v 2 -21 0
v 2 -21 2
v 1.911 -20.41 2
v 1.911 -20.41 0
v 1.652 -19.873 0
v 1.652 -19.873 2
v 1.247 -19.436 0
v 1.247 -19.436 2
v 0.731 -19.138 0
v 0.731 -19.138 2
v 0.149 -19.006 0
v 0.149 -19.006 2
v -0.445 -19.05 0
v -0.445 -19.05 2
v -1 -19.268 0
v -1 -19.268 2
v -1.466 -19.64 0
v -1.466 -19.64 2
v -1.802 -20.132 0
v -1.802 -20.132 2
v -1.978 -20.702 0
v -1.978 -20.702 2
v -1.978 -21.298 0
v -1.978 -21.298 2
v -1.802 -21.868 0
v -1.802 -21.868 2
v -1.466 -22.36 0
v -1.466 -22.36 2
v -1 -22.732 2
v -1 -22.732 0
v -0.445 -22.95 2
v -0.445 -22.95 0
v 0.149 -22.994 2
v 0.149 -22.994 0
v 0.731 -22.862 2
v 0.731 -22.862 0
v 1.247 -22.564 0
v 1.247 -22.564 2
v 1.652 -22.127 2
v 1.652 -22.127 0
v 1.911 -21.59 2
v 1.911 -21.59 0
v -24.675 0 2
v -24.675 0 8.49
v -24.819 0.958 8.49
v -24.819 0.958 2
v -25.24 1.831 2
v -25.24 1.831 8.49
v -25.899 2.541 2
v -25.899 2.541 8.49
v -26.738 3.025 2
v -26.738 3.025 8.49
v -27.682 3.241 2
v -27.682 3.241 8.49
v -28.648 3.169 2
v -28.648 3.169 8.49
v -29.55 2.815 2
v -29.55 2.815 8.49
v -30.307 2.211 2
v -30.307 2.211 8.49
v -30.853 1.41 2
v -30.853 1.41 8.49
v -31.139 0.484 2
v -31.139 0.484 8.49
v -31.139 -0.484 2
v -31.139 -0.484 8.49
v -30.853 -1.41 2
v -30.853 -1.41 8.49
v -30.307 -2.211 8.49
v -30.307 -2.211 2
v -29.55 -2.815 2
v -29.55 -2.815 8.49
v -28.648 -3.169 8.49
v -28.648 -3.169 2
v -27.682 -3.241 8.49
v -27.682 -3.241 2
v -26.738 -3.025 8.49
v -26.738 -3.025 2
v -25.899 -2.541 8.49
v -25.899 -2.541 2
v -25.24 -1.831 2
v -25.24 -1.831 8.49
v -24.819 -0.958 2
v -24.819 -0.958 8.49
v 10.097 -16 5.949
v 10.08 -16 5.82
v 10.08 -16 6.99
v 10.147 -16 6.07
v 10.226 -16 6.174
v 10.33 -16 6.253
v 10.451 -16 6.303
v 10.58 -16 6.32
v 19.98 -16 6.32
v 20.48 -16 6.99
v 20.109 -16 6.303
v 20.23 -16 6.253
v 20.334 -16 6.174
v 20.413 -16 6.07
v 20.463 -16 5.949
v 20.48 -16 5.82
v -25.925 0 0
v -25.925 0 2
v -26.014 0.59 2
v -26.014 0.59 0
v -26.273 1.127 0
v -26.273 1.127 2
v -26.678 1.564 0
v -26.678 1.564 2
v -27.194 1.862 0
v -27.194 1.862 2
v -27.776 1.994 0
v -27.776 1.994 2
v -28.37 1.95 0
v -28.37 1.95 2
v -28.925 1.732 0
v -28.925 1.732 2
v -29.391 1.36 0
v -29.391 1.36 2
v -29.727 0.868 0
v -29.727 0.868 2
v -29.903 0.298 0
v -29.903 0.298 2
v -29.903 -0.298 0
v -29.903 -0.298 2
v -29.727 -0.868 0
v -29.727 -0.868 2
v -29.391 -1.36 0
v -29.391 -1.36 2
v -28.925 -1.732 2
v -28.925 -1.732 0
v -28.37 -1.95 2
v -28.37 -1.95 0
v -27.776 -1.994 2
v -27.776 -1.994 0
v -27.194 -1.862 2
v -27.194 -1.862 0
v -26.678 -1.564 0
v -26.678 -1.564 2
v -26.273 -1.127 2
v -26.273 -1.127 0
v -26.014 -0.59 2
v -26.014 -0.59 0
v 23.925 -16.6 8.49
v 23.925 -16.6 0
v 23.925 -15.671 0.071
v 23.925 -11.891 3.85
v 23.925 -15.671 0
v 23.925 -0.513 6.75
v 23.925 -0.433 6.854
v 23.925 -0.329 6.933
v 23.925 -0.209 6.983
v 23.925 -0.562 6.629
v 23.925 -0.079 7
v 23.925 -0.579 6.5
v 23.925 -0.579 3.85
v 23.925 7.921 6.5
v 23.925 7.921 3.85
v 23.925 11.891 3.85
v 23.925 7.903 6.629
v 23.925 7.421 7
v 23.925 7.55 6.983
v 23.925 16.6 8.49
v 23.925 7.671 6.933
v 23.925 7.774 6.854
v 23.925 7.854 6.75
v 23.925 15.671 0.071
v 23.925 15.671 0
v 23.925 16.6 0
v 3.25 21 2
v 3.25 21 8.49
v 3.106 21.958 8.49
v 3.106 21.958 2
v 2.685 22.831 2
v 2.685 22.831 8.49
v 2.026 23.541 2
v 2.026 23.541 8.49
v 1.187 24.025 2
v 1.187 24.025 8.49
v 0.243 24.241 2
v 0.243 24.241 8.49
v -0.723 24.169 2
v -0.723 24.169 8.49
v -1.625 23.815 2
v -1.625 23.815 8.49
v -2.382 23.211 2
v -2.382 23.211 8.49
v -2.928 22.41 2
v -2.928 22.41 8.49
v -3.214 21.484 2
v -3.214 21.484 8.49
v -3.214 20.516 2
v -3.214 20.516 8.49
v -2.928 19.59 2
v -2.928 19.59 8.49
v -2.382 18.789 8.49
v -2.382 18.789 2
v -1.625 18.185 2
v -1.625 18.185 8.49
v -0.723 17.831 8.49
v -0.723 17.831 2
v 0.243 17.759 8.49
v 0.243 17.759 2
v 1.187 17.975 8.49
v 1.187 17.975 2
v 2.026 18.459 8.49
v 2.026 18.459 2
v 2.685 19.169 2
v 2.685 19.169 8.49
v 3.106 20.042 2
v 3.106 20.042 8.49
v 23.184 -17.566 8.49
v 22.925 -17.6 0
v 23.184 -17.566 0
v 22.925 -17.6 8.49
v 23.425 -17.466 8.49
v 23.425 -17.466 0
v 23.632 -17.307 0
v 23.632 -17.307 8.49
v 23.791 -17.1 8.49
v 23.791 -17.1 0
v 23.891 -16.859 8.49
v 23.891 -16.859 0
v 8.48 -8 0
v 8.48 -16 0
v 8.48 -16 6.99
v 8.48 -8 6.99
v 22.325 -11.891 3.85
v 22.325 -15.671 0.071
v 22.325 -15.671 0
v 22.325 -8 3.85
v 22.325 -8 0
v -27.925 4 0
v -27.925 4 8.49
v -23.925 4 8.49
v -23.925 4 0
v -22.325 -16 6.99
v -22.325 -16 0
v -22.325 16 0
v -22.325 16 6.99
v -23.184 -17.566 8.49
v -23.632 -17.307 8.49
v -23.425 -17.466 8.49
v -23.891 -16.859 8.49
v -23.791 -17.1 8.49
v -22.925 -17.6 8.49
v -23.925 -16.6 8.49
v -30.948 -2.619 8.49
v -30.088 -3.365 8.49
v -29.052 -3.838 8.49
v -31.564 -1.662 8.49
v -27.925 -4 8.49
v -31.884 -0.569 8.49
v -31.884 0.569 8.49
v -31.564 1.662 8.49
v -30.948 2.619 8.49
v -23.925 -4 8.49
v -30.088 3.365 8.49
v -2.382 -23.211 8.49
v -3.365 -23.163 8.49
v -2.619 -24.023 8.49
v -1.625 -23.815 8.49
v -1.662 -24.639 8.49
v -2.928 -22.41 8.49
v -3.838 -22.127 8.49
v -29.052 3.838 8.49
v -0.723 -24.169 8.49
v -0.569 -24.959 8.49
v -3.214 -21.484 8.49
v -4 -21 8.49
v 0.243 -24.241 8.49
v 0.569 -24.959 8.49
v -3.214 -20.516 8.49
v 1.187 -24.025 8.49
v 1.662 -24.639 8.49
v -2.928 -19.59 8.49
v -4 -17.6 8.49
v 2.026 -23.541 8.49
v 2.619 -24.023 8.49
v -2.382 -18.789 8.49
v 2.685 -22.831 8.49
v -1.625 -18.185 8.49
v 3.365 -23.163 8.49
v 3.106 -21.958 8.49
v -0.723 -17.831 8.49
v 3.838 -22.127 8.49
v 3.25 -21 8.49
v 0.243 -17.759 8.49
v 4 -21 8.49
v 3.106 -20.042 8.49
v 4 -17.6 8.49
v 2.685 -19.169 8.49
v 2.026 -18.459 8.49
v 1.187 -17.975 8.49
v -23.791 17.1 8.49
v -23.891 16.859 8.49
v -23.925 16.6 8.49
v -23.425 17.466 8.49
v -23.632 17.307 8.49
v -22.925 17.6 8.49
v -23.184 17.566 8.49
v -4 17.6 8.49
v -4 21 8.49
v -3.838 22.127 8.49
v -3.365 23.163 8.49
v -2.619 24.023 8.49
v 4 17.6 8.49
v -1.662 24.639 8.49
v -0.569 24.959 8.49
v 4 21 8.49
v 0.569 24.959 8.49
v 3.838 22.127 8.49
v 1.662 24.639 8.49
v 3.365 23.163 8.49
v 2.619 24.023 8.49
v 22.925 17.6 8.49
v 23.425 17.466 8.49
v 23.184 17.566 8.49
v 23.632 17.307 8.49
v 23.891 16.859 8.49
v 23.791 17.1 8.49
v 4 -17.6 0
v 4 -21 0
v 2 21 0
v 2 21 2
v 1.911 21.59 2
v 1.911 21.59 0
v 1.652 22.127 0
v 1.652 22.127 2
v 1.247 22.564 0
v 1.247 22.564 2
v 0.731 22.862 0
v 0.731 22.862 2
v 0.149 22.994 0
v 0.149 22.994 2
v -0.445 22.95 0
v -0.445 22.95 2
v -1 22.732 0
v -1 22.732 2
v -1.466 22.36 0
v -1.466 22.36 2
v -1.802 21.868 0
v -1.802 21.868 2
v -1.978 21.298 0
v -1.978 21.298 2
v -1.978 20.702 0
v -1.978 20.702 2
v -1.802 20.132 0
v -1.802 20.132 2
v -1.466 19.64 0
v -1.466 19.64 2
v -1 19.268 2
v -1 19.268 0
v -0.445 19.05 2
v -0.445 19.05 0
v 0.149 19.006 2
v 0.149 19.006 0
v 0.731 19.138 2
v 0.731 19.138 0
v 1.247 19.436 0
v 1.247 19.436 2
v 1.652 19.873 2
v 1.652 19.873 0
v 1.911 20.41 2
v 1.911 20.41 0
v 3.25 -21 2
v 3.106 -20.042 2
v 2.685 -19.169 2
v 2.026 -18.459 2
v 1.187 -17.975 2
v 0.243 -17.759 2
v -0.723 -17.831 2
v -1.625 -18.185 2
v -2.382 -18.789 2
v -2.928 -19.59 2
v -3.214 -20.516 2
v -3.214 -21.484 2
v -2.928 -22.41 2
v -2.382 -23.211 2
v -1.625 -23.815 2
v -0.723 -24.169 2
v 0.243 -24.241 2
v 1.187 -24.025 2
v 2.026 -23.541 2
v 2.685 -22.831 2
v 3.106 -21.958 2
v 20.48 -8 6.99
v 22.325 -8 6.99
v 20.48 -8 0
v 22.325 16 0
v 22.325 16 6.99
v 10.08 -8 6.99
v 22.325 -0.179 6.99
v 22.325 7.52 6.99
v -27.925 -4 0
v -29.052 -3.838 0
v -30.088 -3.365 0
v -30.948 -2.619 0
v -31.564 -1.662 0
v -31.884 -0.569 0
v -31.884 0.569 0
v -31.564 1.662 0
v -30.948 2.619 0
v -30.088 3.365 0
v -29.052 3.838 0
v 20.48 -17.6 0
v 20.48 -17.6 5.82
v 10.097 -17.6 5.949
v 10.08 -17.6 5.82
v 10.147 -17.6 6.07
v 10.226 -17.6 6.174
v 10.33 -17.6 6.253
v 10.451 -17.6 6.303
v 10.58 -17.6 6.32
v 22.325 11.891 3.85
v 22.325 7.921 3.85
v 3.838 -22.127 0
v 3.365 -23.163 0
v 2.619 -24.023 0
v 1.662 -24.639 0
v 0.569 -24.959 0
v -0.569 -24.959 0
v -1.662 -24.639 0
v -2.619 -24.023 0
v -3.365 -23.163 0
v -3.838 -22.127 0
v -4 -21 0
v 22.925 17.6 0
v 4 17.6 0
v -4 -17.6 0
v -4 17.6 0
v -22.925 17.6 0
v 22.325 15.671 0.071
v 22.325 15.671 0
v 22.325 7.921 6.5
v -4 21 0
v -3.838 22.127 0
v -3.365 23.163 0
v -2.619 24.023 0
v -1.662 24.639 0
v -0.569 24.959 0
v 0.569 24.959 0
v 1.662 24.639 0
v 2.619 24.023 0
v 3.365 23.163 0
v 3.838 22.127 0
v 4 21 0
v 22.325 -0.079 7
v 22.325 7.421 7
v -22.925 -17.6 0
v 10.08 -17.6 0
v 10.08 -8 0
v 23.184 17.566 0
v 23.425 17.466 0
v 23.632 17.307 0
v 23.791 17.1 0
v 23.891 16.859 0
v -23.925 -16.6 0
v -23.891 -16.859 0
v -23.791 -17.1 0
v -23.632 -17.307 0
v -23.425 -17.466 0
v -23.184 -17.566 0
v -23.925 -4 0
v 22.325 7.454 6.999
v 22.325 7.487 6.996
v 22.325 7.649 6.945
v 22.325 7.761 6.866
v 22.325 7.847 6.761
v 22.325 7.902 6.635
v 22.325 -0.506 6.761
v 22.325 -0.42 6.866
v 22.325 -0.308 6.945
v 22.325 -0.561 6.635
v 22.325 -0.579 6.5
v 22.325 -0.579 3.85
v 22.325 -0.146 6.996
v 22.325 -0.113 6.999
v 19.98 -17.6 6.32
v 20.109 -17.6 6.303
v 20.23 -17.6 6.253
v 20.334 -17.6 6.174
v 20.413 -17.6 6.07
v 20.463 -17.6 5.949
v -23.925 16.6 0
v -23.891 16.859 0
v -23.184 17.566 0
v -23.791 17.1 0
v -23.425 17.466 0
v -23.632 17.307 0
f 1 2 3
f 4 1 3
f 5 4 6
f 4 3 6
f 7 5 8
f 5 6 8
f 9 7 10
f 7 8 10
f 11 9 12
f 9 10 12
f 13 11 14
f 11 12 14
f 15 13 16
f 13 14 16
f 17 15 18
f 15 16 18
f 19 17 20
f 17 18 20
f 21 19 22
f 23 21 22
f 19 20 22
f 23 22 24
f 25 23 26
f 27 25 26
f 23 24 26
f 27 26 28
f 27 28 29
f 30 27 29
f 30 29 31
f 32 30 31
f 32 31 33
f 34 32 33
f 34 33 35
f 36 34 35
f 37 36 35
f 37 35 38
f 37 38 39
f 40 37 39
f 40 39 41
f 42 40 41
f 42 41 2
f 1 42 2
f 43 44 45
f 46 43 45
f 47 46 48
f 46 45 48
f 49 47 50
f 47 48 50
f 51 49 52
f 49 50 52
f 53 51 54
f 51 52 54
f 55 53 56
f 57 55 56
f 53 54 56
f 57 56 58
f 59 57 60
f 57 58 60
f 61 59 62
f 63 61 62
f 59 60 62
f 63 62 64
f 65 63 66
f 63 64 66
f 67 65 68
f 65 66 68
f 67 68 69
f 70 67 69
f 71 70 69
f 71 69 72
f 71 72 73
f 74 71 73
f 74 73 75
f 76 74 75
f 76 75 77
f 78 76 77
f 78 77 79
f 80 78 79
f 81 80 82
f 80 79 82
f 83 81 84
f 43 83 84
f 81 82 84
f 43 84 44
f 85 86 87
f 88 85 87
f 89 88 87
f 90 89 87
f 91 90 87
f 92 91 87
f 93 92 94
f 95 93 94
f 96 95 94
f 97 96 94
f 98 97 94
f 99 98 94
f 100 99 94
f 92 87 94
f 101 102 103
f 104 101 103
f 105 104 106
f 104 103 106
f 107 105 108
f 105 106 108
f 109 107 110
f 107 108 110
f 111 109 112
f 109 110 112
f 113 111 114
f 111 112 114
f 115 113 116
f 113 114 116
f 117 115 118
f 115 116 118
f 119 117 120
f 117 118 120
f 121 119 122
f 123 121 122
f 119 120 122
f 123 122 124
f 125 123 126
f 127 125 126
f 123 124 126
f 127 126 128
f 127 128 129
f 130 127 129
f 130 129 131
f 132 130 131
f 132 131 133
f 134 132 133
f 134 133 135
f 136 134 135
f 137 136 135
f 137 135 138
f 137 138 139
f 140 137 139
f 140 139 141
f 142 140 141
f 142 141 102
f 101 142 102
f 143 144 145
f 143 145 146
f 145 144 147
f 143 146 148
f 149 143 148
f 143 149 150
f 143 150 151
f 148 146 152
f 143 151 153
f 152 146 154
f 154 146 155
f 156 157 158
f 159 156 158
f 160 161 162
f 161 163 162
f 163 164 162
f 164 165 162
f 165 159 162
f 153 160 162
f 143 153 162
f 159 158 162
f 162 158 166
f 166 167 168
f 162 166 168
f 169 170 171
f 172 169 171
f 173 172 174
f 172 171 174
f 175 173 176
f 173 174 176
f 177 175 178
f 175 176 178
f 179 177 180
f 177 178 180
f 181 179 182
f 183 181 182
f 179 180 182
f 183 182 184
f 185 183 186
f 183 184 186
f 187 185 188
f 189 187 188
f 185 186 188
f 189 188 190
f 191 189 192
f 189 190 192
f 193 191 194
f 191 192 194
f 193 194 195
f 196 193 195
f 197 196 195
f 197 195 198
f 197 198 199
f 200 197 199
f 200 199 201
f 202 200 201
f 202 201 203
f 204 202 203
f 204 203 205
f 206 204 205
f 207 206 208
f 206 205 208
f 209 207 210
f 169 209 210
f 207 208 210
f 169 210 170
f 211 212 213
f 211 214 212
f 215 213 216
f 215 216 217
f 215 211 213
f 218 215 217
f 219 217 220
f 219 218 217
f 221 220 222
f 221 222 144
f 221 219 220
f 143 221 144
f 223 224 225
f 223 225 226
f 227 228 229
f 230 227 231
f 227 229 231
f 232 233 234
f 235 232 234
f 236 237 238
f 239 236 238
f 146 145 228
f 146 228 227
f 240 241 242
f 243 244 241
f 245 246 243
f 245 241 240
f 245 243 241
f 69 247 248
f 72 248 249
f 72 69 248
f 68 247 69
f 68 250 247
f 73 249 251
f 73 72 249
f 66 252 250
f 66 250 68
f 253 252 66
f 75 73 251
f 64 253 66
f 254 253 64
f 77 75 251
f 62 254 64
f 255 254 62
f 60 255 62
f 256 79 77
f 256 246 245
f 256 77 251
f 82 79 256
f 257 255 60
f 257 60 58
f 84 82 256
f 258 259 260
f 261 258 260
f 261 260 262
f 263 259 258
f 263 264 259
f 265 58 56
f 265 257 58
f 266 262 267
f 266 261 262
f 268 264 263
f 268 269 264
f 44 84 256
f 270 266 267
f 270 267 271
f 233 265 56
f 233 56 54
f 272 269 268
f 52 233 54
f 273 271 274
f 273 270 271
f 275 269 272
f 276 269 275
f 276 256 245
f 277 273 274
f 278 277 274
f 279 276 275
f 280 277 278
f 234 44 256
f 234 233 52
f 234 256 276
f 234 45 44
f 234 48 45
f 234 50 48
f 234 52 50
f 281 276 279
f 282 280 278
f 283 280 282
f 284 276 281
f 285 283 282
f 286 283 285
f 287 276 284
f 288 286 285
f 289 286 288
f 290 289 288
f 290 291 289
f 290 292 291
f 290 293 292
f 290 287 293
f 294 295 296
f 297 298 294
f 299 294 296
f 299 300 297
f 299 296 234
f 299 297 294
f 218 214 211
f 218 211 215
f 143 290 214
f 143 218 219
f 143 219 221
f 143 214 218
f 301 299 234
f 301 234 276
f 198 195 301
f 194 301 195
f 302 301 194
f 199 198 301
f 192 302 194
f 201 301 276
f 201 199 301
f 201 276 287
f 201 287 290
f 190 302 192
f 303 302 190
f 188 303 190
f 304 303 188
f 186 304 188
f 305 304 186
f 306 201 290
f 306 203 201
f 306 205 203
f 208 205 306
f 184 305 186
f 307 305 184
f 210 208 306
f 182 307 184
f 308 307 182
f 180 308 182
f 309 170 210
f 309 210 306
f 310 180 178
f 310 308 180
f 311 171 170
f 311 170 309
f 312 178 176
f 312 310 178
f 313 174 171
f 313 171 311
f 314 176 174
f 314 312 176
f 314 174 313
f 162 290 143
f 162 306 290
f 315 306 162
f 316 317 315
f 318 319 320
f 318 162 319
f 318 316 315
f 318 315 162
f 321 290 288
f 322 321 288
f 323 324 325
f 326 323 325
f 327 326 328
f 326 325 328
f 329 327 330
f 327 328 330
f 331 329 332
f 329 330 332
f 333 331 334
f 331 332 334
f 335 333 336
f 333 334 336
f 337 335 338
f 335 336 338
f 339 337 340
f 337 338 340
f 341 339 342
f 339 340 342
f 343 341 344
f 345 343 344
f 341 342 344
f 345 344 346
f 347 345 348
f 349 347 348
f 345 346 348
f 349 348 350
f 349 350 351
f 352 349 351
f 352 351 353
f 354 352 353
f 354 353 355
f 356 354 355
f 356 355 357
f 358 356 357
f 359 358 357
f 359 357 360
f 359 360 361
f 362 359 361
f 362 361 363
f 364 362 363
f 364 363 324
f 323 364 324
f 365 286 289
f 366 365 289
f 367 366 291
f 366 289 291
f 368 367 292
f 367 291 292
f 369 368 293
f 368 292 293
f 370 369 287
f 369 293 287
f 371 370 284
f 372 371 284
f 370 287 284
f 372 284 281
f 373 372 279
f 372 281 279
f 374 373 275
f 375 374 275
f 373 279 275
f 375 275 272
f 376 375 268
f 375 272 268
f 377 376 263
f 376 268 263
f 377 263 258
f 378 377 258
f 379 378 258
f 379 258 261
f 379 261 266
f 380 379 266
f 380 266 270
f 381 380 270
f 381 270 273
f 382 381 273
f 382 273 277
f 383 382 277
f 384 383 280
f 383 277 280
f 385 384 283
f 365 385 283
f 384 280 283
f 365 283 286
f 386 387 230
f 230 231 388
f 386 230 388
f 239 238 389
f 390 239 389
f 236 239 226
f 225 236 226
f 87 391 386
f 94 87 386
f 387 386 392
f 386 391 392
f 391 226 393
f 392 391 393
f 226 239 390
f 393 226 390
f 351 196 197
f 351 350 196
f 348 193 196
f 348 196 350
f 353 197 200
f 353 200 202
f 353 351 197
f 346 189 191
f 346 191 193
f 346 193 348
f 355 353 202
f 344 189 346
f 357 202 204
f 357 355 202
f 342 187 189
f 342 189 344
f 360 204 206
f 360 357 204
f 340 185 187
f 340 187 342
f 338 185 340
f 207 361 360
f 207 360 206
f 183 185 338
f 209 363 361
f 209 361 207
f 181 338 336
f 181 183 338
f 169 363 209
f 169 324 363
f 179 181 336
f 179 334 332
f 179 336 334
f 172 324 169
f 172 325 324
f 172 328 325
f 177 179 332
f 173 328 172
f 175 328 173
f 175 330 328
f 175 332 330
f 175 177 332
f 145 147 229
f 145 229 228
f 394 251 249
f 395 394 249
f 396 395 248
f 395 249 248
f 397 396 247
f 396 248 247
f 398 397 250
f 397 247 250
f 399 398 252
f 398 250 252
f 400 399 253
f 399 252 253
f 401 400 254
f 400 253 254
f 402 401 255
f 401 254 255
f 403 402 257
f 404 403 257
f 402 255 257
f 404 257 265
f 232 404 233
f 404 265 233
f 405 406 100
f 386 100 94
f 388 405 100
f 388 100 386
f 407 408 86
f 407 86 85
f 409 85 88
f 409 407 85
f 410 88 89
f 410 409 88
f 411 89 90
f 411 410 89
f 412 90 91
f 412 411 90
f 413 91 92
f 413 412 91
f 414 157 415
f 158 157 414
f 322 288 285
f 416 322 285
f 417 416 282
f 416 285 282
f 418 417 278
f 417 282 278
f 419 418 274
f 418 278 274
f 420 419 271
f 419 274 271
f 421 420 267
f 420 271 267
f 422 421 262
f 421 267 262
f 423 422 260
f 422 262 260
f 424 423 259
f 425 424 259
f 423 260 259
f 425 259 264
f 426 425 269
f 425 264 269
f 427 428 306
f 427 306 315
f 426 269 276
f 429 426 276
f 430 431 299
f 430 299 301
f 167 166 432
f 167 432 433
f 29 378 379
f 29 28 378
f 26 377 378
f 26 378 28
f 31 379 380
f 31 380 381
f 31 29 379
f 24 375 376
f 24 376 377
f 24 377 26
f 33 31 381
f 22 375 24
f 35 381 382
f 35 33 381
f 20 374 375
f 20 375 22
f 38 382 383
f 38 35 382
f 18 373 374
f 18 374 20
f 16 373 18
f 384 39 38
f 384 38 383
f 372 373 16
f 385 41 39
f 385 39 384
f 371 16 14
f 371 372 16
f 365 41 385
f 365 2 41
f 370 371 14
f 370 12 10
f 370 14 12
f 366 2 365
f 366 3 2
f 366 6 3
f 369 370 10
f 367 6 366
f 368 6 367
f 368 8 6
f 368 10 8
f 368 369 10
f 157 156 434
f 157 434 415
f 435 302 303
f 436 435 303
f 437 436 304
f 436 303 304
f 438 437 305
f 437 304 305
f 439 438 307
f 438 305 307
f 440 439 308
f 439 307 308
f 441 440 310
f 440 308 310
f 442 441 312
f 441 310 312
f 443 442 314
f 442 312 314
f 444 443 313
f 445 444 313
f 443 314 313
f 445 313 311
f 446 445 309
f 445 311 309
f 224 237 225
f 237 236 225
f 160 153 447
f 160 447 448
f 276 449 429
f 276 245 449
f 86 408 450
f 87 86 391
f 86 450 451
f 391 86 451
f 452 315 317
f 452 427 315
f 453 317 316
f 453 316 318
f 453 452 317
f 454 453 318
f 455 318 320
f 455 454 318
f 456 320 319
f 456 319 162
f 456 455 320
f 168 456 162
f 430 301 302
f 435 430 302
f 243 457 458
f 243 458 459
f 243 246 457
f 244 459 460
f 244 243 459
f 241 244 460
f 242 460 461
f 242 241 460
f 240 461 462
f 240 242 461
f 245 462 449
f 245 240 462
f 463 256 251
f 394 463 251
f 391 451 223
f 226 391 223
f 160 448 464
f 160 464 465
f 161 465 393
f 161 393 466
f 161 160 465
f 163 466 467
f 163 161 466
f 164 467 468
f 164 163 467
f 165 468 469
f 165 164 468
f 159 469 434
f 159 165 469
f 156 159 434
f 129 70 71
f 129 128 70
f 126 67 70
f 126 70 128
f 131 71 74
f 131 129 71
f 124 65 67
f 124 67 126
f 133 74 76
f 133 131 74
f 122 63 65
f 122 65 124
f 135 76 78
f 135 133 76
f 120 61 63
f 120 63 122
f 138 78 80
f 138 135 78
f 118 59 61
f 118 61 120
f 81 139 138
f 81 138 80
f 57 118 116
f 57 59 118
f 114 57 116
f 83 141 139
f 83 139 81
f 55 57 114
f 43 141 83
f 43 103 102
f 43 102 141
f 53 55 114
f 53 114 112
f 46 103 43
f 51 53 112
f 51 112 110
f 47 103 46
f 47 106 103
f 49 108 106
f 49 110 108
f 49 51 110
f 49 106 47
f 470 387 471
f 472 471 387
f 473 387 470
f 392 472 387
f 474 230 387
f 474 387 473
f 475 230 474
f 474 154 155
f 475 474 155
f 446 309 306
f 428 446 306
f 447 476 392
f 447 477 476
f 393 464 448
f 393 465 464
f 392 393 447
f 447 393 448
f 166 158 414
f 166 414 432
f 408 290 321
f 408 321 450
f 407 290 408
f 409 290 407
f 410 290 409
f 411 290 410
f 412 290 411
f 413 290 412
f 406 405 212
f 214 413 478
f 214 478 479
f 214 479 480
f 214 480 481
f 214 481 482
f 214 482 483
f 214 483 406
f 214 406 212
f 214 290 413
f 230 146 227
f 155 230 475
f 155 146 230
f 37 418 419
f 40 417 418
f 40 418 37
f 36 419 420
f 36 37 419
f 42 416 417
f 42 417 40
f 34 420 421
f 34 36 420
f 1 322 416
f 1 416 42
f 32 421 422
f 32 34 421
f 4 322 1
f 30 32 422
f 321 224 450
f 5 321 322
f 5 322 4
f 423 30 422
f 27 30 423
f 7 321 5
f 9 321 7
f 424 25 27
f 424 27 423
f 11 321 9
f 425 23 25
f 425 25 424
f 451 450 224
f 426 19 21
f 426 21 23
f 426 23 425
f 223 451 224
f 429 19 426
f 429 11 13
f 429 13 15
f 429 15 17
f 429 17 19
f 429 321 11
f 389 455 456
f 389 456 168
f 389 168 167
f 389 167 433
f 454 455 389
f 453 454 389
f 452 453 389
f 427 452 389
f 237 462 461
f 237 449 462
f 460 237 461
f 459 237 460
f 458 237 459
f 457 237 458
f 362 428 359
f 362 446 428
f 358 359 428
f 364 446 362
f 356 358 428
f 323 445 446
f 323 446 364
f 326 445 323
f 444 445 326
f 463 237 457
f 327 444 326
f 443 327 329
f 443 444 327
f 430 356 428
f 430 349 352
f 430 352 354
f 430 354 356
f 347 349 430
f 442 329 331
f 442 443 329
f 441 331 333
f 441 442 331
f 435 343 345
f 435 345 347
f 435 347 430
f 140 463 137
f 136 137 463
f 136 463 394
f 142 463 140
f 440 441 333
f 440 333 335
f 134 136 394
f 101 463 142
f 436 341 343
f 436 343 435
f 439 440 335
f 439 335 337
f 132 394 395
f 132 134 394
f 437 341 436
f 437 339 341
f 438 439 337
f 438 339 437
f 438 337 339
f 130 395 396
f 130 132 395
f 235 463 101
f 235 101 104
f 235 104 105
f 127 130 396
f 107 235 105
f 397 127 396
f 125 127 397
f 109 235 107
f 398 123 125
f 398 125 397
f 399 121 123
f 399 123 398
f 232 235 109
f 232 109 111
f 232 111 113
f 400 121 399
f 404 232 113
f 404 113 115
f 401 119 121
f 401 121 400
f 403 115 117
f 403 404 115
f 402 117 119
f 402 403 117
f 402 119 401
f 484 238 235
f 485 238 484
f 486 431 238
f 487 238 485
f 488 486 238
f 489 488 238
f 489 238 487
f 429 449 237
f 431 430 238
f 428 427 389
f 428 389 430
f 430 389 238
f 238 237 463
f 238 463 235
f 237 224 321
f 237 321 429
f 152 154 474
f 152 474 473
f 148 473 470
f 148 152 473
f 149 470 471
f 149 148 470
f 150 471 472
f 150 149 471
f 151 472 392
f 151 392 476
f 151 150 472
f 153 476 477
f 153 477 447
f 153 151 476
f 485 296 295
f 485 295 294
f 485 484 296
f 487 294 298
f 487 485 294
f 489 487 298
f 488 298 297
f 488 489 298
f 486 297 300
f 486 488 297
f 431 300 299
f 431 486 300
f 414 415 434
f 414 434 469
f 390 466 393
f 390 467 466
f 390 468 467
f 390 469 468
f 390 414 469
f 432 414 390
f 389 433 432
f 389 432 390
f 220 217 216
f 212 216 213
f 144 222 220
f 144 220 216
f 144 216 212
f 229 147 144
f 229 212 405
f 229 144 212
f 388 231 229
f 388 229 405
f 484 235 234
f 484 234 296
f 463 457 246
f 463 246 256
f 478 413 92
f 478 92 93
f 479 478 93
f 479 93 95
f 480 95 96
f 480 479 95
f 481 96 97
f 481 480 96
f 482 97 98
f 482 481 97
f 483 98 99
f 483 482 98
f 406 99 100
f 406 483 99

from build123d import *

# Parameters (mm, degrees)
SKETCH1_W           = 47.85
SKETCH1_H           = 35.2
SKETCH1_W_2         = 44.65
SKETCH1_H_2         = 32
BOSS_EXTRUDE1_DEPTH = 6.99
SKETCH2_W           = 47.85
SKETCH2_H           = 35.2
BOSS_EXTRUDE2_DEPTH = 1.5
CUT_EXTRUDE1_REACH  = 53.686
SKETCH4_W           = 3.5
SKETCH4_H           = 8.5
CUT_EXTRUDE2_DEPTH  = 1.6
CUT_EXTRUDE3_REACH  = 45.4
SKETCH6_W           = 10.4
SKETCH6_H           = 6.6
FILLET1_R           = 1
FILLET2_R           = 0.5
SKETCH7_R           = 2
BOSS_EXTRUDE3_DEPTH = 8.49
SKETCH8_R           = 3.25
CUT_EXTRUDE4_DEPTH  = 6.49
BOSS_EXTRUDE4_REACH = 43.428
SKETCH9_W           = 1.6
SKETCH9_H           = 8
SKETCH9_W_2         = 1.845


with BuildPart() as part:
    # Sketch1 → Boss-Extrude1 (new body)
    with BuildSketch(Plane.XY):
        Rectangle(SKETCH1_W, SKETCH1_H)
        Rectangle(SKETCH1_W_2, SKETCH1_H_2, mode=Mode.SUBTRACT)
    extrude(amount=BOSS_EXTRUDE1_DEPTH)

    # Sketch2 → Boss-Extrude2 (add)
    with BuildSketch(Plane.XY.offset(6.99)):
        Rectangle(SKETCH2_W, SKETCH2_H)
    extrude(amount=BOSS_EXTRUDE2_DEPTH)

    # Sketch3 → Cut-Extrude1 (cut, up to next)
    with BuildSketch(Plane(origin=(23.925, 0, 0), x_dir=(0, 0, -1), z_dir=(1, 0, 0)), mode=Mode.PRIVATE) as cut_extrude1_sk1:
        Polygon((-0.070710678, 15.670710678), (0, 15.670710678), (0, -15.670710678), (-0.070710678, -15.670710678), (-3.85, -11.891421356), (-3.85, 11.891421356), align=None)
    cut_extrude1_tool1 = extrude(cut_extrude1_sk1.sketch, amount=-CUT_EXTRUDE1_REACH, mode=Mode.PRIVATE) & part.part
    add(cut_extrude1_tool1.solids().sort_by_distance((23.925, 0, 1.835684))[0], mode=Mode.SUBTRACT)

    # Sketch4 → Cut-Extrude2 (cut)
    with BuildSketch(Plane(origin=(23.925, 0, 0), x_dir=(0, 0, -1), z_dir=(1, 0, 0))):
        with Locations((-5.25, 3.670508357)):
            Rectangle(SKETCH4_W, SKETCH4_H)
    extrude(amount=-CUT_EXTRUDE2_DEPTH, mode=Mode.SUBTRACT)

    # Sketch6 → Cut-Extrude3 (cut, up to next)
    with BuildSketch(Plane.XZ.offset(17.6), mode=Mode.PRIVATE) as cut_extrude3_sk1:
        with Locations((15.28, 3.02)):
            Rectangle(SKETCH6_W, SKETCH6_H)
    cut_extrude3_tool1 = extrude(cut_extrude3_sk1.sketch, amount=-CUT_EXTRUDE3_REACH, mode=Mode.PRIVATE) & part.part
    add(cut_extrude3_tool1.solids().sort_by_distance((15.28, -17.6, 3.02))[0], mode=Mode.SUBTRACT)

    # Fillet1
    fillet1_edges = [part.edges().sort_by_distance(p)[0] for p in [
        (-23.925, 17.6, 4.245),
        (23.925, 17.6, 4.245),
        (23.925, -17.6, 4.245),
        (-23.925, -17.6, 4.245),
    ]]
    fillet(fillet1_edges, radius=FILLET1_R)

    # Fillet2
    # the kernel refuses this fillet: 0.5 mm, written as the material it adds along each edge
    with BuildSketch(Plane(origin=(20.48, -17.6, 6.32), x_dir=(-1, 0, 0), z_dir=(0, 1, 0)), Plane(origin=(10.08, -17.6, 6.32), x_dir=(0, 0, -1), z_dir=(0, 1, 0)), Plane(origin=(23.925, 7.920508357, 7), x_dir=(0, -1, 0), z_dir=(-1, 0, 0)), Plane(origin=(23.925, -0.579491643, 7), x_dir=(0, 0, -1), z_dir=(-1, 0, 0))) as fillet2_piece_1:
        with BuildLine():
            CenterArc((FILLET2_R, -FILLET2_R), FILLET2_R, 90, 90)
            Line((0, -FILLET2_R), (0, 0))
            Line((0, 0), (FILLET2_R, 0))
        make_face()
    extrude(amount=1.6)

    # Sketch7 → Boss-Extrude3 (add)
    # profile 1 of 3: a face of its own
    with BuildSketch(Plane.XY.offset(8.49)):
        with BuildLine():
            Line((4, -17.6), (4, -21))
            ThreePointArc((4, -21), (0, -25), (-4, -21))
            Line((-4, -21), (-4, -17.6))
            Line((-4, -17.6), (4, -17.6))
        make_face()
        with Locations((0, -21)):
            Circle(SKETCH7_R, mode=Mode.SUBTRACT)
    # profile 2 of 3: a face of its own
    with BuildSketch(Plane.XY.offset(8.49)):
        with BuildLine():
            Line((-4, 17.6), (-4, 21))
            ThreePointArc((-4, 21), (0, 25), (4, 21))
            Line((4, 21), (4, 17.6))
            Line((4, 17.6), (-4, 17.6))
        make_face()
        with Locations((0, 21)):
            Circle(SKETCH7_R, mode=Mode.SUBTRACT)
    # profile 3 of 3: a face of its own
    with BuildSketch(Plane.XY.offset(8.49)):
        with BuildLine():
            Line((-23.925, -4), (-27.925, -4))
            ThreePointArc((-27.925, -4), (-31.925, 0), (-27.925, 4))
            Line((-27.925, 4), (-23.925, 4))
            Line((-23.925, 4), (-23.925, -4))
        make_face()
        with Locations((-27.925, 0)):
            Circle(SKETCH7_R, mode=Mode.SUBTRACT)
    extrude(amount=-BOSS_EXTRUDE3_DEPTH)

    # Sketch8 → Cut-Extrude4 (cut)
    with BuildSketch(Plane.XY.offset(8.49)):
        with Locations((0, 21)):
            Circle(SKETCH8_R)
        with Locations((0, -21)):
            Circle(SKETCH8_R)
        with Locations((-27.925, 0)):
            Circle(SKETCH8_R)
    extrude(amount=-CUT_EXTRUDE4_DEPTH, mode=Mode.SUBTRACT)

    # Boss-Extrude4: up to this face of the body (flat: up to its plane)
    boss_extrude4_end = Plane(part.part.faces().sort_by_distance((0, 0, 6.99))[0])
    # Sketch9 → Boss-Extrude4 (add, up to the picked face)
    with BuildSketch(Plane(origin=(0, 0, 0), x_dir=(-1, 0, 0), z_dir=(0, 0, -1)), mode=Mode.PRIVATE) as boss_extrude4_sk1:
        with Locations((-9.28, -12)):
            Rectangle(SKETCH9_W, SKETCH9_H)
    boss_extrude4_tool1 = split(extrude(boss_extrude4_sk1.sketch, amount=-BOSS_EXTRUDE4_REACH, mode=Mode.PRIVATE), bisect_by=boss_extrude4_end, keep=Keep.BOTH, mode=Mode.PRIVATE)
    # Sketch9 → Boss-Extrude4 (add, up to the picked face)
    with BuildSketch(Plane(origin=(0, 0, 0), x_dir=(-1, 0, 0), z_dir=(0, 0, -1)), mode=Mode.PRIVATE) as boss_extrude4_sk2:
        with Locations((-21.4025, -12)):
            Rectangle(SKETCH9_W_2, SKETCH9_H)
    boss_extrude4_tool2 = split(extrude(boss_extrude4_sk2.sketch, amount=-BOSS_EXTRUDE4_REACH, mode=Mode.PRIVATE), bisect_by=boss_extrude4_end, keep=Keep.BOTH, mode=Mode.PRIVATE)
    add(boss_extrude4_tool1.solids().sort_by(Axis((9.28, -12, 0), (0, 0, 1)))[0])
    add(boss_extrude4_tool2.solids().sort_by(Axis((21.4025, -12, 0), (0, 0, 1)))[0])


solid = part.part
